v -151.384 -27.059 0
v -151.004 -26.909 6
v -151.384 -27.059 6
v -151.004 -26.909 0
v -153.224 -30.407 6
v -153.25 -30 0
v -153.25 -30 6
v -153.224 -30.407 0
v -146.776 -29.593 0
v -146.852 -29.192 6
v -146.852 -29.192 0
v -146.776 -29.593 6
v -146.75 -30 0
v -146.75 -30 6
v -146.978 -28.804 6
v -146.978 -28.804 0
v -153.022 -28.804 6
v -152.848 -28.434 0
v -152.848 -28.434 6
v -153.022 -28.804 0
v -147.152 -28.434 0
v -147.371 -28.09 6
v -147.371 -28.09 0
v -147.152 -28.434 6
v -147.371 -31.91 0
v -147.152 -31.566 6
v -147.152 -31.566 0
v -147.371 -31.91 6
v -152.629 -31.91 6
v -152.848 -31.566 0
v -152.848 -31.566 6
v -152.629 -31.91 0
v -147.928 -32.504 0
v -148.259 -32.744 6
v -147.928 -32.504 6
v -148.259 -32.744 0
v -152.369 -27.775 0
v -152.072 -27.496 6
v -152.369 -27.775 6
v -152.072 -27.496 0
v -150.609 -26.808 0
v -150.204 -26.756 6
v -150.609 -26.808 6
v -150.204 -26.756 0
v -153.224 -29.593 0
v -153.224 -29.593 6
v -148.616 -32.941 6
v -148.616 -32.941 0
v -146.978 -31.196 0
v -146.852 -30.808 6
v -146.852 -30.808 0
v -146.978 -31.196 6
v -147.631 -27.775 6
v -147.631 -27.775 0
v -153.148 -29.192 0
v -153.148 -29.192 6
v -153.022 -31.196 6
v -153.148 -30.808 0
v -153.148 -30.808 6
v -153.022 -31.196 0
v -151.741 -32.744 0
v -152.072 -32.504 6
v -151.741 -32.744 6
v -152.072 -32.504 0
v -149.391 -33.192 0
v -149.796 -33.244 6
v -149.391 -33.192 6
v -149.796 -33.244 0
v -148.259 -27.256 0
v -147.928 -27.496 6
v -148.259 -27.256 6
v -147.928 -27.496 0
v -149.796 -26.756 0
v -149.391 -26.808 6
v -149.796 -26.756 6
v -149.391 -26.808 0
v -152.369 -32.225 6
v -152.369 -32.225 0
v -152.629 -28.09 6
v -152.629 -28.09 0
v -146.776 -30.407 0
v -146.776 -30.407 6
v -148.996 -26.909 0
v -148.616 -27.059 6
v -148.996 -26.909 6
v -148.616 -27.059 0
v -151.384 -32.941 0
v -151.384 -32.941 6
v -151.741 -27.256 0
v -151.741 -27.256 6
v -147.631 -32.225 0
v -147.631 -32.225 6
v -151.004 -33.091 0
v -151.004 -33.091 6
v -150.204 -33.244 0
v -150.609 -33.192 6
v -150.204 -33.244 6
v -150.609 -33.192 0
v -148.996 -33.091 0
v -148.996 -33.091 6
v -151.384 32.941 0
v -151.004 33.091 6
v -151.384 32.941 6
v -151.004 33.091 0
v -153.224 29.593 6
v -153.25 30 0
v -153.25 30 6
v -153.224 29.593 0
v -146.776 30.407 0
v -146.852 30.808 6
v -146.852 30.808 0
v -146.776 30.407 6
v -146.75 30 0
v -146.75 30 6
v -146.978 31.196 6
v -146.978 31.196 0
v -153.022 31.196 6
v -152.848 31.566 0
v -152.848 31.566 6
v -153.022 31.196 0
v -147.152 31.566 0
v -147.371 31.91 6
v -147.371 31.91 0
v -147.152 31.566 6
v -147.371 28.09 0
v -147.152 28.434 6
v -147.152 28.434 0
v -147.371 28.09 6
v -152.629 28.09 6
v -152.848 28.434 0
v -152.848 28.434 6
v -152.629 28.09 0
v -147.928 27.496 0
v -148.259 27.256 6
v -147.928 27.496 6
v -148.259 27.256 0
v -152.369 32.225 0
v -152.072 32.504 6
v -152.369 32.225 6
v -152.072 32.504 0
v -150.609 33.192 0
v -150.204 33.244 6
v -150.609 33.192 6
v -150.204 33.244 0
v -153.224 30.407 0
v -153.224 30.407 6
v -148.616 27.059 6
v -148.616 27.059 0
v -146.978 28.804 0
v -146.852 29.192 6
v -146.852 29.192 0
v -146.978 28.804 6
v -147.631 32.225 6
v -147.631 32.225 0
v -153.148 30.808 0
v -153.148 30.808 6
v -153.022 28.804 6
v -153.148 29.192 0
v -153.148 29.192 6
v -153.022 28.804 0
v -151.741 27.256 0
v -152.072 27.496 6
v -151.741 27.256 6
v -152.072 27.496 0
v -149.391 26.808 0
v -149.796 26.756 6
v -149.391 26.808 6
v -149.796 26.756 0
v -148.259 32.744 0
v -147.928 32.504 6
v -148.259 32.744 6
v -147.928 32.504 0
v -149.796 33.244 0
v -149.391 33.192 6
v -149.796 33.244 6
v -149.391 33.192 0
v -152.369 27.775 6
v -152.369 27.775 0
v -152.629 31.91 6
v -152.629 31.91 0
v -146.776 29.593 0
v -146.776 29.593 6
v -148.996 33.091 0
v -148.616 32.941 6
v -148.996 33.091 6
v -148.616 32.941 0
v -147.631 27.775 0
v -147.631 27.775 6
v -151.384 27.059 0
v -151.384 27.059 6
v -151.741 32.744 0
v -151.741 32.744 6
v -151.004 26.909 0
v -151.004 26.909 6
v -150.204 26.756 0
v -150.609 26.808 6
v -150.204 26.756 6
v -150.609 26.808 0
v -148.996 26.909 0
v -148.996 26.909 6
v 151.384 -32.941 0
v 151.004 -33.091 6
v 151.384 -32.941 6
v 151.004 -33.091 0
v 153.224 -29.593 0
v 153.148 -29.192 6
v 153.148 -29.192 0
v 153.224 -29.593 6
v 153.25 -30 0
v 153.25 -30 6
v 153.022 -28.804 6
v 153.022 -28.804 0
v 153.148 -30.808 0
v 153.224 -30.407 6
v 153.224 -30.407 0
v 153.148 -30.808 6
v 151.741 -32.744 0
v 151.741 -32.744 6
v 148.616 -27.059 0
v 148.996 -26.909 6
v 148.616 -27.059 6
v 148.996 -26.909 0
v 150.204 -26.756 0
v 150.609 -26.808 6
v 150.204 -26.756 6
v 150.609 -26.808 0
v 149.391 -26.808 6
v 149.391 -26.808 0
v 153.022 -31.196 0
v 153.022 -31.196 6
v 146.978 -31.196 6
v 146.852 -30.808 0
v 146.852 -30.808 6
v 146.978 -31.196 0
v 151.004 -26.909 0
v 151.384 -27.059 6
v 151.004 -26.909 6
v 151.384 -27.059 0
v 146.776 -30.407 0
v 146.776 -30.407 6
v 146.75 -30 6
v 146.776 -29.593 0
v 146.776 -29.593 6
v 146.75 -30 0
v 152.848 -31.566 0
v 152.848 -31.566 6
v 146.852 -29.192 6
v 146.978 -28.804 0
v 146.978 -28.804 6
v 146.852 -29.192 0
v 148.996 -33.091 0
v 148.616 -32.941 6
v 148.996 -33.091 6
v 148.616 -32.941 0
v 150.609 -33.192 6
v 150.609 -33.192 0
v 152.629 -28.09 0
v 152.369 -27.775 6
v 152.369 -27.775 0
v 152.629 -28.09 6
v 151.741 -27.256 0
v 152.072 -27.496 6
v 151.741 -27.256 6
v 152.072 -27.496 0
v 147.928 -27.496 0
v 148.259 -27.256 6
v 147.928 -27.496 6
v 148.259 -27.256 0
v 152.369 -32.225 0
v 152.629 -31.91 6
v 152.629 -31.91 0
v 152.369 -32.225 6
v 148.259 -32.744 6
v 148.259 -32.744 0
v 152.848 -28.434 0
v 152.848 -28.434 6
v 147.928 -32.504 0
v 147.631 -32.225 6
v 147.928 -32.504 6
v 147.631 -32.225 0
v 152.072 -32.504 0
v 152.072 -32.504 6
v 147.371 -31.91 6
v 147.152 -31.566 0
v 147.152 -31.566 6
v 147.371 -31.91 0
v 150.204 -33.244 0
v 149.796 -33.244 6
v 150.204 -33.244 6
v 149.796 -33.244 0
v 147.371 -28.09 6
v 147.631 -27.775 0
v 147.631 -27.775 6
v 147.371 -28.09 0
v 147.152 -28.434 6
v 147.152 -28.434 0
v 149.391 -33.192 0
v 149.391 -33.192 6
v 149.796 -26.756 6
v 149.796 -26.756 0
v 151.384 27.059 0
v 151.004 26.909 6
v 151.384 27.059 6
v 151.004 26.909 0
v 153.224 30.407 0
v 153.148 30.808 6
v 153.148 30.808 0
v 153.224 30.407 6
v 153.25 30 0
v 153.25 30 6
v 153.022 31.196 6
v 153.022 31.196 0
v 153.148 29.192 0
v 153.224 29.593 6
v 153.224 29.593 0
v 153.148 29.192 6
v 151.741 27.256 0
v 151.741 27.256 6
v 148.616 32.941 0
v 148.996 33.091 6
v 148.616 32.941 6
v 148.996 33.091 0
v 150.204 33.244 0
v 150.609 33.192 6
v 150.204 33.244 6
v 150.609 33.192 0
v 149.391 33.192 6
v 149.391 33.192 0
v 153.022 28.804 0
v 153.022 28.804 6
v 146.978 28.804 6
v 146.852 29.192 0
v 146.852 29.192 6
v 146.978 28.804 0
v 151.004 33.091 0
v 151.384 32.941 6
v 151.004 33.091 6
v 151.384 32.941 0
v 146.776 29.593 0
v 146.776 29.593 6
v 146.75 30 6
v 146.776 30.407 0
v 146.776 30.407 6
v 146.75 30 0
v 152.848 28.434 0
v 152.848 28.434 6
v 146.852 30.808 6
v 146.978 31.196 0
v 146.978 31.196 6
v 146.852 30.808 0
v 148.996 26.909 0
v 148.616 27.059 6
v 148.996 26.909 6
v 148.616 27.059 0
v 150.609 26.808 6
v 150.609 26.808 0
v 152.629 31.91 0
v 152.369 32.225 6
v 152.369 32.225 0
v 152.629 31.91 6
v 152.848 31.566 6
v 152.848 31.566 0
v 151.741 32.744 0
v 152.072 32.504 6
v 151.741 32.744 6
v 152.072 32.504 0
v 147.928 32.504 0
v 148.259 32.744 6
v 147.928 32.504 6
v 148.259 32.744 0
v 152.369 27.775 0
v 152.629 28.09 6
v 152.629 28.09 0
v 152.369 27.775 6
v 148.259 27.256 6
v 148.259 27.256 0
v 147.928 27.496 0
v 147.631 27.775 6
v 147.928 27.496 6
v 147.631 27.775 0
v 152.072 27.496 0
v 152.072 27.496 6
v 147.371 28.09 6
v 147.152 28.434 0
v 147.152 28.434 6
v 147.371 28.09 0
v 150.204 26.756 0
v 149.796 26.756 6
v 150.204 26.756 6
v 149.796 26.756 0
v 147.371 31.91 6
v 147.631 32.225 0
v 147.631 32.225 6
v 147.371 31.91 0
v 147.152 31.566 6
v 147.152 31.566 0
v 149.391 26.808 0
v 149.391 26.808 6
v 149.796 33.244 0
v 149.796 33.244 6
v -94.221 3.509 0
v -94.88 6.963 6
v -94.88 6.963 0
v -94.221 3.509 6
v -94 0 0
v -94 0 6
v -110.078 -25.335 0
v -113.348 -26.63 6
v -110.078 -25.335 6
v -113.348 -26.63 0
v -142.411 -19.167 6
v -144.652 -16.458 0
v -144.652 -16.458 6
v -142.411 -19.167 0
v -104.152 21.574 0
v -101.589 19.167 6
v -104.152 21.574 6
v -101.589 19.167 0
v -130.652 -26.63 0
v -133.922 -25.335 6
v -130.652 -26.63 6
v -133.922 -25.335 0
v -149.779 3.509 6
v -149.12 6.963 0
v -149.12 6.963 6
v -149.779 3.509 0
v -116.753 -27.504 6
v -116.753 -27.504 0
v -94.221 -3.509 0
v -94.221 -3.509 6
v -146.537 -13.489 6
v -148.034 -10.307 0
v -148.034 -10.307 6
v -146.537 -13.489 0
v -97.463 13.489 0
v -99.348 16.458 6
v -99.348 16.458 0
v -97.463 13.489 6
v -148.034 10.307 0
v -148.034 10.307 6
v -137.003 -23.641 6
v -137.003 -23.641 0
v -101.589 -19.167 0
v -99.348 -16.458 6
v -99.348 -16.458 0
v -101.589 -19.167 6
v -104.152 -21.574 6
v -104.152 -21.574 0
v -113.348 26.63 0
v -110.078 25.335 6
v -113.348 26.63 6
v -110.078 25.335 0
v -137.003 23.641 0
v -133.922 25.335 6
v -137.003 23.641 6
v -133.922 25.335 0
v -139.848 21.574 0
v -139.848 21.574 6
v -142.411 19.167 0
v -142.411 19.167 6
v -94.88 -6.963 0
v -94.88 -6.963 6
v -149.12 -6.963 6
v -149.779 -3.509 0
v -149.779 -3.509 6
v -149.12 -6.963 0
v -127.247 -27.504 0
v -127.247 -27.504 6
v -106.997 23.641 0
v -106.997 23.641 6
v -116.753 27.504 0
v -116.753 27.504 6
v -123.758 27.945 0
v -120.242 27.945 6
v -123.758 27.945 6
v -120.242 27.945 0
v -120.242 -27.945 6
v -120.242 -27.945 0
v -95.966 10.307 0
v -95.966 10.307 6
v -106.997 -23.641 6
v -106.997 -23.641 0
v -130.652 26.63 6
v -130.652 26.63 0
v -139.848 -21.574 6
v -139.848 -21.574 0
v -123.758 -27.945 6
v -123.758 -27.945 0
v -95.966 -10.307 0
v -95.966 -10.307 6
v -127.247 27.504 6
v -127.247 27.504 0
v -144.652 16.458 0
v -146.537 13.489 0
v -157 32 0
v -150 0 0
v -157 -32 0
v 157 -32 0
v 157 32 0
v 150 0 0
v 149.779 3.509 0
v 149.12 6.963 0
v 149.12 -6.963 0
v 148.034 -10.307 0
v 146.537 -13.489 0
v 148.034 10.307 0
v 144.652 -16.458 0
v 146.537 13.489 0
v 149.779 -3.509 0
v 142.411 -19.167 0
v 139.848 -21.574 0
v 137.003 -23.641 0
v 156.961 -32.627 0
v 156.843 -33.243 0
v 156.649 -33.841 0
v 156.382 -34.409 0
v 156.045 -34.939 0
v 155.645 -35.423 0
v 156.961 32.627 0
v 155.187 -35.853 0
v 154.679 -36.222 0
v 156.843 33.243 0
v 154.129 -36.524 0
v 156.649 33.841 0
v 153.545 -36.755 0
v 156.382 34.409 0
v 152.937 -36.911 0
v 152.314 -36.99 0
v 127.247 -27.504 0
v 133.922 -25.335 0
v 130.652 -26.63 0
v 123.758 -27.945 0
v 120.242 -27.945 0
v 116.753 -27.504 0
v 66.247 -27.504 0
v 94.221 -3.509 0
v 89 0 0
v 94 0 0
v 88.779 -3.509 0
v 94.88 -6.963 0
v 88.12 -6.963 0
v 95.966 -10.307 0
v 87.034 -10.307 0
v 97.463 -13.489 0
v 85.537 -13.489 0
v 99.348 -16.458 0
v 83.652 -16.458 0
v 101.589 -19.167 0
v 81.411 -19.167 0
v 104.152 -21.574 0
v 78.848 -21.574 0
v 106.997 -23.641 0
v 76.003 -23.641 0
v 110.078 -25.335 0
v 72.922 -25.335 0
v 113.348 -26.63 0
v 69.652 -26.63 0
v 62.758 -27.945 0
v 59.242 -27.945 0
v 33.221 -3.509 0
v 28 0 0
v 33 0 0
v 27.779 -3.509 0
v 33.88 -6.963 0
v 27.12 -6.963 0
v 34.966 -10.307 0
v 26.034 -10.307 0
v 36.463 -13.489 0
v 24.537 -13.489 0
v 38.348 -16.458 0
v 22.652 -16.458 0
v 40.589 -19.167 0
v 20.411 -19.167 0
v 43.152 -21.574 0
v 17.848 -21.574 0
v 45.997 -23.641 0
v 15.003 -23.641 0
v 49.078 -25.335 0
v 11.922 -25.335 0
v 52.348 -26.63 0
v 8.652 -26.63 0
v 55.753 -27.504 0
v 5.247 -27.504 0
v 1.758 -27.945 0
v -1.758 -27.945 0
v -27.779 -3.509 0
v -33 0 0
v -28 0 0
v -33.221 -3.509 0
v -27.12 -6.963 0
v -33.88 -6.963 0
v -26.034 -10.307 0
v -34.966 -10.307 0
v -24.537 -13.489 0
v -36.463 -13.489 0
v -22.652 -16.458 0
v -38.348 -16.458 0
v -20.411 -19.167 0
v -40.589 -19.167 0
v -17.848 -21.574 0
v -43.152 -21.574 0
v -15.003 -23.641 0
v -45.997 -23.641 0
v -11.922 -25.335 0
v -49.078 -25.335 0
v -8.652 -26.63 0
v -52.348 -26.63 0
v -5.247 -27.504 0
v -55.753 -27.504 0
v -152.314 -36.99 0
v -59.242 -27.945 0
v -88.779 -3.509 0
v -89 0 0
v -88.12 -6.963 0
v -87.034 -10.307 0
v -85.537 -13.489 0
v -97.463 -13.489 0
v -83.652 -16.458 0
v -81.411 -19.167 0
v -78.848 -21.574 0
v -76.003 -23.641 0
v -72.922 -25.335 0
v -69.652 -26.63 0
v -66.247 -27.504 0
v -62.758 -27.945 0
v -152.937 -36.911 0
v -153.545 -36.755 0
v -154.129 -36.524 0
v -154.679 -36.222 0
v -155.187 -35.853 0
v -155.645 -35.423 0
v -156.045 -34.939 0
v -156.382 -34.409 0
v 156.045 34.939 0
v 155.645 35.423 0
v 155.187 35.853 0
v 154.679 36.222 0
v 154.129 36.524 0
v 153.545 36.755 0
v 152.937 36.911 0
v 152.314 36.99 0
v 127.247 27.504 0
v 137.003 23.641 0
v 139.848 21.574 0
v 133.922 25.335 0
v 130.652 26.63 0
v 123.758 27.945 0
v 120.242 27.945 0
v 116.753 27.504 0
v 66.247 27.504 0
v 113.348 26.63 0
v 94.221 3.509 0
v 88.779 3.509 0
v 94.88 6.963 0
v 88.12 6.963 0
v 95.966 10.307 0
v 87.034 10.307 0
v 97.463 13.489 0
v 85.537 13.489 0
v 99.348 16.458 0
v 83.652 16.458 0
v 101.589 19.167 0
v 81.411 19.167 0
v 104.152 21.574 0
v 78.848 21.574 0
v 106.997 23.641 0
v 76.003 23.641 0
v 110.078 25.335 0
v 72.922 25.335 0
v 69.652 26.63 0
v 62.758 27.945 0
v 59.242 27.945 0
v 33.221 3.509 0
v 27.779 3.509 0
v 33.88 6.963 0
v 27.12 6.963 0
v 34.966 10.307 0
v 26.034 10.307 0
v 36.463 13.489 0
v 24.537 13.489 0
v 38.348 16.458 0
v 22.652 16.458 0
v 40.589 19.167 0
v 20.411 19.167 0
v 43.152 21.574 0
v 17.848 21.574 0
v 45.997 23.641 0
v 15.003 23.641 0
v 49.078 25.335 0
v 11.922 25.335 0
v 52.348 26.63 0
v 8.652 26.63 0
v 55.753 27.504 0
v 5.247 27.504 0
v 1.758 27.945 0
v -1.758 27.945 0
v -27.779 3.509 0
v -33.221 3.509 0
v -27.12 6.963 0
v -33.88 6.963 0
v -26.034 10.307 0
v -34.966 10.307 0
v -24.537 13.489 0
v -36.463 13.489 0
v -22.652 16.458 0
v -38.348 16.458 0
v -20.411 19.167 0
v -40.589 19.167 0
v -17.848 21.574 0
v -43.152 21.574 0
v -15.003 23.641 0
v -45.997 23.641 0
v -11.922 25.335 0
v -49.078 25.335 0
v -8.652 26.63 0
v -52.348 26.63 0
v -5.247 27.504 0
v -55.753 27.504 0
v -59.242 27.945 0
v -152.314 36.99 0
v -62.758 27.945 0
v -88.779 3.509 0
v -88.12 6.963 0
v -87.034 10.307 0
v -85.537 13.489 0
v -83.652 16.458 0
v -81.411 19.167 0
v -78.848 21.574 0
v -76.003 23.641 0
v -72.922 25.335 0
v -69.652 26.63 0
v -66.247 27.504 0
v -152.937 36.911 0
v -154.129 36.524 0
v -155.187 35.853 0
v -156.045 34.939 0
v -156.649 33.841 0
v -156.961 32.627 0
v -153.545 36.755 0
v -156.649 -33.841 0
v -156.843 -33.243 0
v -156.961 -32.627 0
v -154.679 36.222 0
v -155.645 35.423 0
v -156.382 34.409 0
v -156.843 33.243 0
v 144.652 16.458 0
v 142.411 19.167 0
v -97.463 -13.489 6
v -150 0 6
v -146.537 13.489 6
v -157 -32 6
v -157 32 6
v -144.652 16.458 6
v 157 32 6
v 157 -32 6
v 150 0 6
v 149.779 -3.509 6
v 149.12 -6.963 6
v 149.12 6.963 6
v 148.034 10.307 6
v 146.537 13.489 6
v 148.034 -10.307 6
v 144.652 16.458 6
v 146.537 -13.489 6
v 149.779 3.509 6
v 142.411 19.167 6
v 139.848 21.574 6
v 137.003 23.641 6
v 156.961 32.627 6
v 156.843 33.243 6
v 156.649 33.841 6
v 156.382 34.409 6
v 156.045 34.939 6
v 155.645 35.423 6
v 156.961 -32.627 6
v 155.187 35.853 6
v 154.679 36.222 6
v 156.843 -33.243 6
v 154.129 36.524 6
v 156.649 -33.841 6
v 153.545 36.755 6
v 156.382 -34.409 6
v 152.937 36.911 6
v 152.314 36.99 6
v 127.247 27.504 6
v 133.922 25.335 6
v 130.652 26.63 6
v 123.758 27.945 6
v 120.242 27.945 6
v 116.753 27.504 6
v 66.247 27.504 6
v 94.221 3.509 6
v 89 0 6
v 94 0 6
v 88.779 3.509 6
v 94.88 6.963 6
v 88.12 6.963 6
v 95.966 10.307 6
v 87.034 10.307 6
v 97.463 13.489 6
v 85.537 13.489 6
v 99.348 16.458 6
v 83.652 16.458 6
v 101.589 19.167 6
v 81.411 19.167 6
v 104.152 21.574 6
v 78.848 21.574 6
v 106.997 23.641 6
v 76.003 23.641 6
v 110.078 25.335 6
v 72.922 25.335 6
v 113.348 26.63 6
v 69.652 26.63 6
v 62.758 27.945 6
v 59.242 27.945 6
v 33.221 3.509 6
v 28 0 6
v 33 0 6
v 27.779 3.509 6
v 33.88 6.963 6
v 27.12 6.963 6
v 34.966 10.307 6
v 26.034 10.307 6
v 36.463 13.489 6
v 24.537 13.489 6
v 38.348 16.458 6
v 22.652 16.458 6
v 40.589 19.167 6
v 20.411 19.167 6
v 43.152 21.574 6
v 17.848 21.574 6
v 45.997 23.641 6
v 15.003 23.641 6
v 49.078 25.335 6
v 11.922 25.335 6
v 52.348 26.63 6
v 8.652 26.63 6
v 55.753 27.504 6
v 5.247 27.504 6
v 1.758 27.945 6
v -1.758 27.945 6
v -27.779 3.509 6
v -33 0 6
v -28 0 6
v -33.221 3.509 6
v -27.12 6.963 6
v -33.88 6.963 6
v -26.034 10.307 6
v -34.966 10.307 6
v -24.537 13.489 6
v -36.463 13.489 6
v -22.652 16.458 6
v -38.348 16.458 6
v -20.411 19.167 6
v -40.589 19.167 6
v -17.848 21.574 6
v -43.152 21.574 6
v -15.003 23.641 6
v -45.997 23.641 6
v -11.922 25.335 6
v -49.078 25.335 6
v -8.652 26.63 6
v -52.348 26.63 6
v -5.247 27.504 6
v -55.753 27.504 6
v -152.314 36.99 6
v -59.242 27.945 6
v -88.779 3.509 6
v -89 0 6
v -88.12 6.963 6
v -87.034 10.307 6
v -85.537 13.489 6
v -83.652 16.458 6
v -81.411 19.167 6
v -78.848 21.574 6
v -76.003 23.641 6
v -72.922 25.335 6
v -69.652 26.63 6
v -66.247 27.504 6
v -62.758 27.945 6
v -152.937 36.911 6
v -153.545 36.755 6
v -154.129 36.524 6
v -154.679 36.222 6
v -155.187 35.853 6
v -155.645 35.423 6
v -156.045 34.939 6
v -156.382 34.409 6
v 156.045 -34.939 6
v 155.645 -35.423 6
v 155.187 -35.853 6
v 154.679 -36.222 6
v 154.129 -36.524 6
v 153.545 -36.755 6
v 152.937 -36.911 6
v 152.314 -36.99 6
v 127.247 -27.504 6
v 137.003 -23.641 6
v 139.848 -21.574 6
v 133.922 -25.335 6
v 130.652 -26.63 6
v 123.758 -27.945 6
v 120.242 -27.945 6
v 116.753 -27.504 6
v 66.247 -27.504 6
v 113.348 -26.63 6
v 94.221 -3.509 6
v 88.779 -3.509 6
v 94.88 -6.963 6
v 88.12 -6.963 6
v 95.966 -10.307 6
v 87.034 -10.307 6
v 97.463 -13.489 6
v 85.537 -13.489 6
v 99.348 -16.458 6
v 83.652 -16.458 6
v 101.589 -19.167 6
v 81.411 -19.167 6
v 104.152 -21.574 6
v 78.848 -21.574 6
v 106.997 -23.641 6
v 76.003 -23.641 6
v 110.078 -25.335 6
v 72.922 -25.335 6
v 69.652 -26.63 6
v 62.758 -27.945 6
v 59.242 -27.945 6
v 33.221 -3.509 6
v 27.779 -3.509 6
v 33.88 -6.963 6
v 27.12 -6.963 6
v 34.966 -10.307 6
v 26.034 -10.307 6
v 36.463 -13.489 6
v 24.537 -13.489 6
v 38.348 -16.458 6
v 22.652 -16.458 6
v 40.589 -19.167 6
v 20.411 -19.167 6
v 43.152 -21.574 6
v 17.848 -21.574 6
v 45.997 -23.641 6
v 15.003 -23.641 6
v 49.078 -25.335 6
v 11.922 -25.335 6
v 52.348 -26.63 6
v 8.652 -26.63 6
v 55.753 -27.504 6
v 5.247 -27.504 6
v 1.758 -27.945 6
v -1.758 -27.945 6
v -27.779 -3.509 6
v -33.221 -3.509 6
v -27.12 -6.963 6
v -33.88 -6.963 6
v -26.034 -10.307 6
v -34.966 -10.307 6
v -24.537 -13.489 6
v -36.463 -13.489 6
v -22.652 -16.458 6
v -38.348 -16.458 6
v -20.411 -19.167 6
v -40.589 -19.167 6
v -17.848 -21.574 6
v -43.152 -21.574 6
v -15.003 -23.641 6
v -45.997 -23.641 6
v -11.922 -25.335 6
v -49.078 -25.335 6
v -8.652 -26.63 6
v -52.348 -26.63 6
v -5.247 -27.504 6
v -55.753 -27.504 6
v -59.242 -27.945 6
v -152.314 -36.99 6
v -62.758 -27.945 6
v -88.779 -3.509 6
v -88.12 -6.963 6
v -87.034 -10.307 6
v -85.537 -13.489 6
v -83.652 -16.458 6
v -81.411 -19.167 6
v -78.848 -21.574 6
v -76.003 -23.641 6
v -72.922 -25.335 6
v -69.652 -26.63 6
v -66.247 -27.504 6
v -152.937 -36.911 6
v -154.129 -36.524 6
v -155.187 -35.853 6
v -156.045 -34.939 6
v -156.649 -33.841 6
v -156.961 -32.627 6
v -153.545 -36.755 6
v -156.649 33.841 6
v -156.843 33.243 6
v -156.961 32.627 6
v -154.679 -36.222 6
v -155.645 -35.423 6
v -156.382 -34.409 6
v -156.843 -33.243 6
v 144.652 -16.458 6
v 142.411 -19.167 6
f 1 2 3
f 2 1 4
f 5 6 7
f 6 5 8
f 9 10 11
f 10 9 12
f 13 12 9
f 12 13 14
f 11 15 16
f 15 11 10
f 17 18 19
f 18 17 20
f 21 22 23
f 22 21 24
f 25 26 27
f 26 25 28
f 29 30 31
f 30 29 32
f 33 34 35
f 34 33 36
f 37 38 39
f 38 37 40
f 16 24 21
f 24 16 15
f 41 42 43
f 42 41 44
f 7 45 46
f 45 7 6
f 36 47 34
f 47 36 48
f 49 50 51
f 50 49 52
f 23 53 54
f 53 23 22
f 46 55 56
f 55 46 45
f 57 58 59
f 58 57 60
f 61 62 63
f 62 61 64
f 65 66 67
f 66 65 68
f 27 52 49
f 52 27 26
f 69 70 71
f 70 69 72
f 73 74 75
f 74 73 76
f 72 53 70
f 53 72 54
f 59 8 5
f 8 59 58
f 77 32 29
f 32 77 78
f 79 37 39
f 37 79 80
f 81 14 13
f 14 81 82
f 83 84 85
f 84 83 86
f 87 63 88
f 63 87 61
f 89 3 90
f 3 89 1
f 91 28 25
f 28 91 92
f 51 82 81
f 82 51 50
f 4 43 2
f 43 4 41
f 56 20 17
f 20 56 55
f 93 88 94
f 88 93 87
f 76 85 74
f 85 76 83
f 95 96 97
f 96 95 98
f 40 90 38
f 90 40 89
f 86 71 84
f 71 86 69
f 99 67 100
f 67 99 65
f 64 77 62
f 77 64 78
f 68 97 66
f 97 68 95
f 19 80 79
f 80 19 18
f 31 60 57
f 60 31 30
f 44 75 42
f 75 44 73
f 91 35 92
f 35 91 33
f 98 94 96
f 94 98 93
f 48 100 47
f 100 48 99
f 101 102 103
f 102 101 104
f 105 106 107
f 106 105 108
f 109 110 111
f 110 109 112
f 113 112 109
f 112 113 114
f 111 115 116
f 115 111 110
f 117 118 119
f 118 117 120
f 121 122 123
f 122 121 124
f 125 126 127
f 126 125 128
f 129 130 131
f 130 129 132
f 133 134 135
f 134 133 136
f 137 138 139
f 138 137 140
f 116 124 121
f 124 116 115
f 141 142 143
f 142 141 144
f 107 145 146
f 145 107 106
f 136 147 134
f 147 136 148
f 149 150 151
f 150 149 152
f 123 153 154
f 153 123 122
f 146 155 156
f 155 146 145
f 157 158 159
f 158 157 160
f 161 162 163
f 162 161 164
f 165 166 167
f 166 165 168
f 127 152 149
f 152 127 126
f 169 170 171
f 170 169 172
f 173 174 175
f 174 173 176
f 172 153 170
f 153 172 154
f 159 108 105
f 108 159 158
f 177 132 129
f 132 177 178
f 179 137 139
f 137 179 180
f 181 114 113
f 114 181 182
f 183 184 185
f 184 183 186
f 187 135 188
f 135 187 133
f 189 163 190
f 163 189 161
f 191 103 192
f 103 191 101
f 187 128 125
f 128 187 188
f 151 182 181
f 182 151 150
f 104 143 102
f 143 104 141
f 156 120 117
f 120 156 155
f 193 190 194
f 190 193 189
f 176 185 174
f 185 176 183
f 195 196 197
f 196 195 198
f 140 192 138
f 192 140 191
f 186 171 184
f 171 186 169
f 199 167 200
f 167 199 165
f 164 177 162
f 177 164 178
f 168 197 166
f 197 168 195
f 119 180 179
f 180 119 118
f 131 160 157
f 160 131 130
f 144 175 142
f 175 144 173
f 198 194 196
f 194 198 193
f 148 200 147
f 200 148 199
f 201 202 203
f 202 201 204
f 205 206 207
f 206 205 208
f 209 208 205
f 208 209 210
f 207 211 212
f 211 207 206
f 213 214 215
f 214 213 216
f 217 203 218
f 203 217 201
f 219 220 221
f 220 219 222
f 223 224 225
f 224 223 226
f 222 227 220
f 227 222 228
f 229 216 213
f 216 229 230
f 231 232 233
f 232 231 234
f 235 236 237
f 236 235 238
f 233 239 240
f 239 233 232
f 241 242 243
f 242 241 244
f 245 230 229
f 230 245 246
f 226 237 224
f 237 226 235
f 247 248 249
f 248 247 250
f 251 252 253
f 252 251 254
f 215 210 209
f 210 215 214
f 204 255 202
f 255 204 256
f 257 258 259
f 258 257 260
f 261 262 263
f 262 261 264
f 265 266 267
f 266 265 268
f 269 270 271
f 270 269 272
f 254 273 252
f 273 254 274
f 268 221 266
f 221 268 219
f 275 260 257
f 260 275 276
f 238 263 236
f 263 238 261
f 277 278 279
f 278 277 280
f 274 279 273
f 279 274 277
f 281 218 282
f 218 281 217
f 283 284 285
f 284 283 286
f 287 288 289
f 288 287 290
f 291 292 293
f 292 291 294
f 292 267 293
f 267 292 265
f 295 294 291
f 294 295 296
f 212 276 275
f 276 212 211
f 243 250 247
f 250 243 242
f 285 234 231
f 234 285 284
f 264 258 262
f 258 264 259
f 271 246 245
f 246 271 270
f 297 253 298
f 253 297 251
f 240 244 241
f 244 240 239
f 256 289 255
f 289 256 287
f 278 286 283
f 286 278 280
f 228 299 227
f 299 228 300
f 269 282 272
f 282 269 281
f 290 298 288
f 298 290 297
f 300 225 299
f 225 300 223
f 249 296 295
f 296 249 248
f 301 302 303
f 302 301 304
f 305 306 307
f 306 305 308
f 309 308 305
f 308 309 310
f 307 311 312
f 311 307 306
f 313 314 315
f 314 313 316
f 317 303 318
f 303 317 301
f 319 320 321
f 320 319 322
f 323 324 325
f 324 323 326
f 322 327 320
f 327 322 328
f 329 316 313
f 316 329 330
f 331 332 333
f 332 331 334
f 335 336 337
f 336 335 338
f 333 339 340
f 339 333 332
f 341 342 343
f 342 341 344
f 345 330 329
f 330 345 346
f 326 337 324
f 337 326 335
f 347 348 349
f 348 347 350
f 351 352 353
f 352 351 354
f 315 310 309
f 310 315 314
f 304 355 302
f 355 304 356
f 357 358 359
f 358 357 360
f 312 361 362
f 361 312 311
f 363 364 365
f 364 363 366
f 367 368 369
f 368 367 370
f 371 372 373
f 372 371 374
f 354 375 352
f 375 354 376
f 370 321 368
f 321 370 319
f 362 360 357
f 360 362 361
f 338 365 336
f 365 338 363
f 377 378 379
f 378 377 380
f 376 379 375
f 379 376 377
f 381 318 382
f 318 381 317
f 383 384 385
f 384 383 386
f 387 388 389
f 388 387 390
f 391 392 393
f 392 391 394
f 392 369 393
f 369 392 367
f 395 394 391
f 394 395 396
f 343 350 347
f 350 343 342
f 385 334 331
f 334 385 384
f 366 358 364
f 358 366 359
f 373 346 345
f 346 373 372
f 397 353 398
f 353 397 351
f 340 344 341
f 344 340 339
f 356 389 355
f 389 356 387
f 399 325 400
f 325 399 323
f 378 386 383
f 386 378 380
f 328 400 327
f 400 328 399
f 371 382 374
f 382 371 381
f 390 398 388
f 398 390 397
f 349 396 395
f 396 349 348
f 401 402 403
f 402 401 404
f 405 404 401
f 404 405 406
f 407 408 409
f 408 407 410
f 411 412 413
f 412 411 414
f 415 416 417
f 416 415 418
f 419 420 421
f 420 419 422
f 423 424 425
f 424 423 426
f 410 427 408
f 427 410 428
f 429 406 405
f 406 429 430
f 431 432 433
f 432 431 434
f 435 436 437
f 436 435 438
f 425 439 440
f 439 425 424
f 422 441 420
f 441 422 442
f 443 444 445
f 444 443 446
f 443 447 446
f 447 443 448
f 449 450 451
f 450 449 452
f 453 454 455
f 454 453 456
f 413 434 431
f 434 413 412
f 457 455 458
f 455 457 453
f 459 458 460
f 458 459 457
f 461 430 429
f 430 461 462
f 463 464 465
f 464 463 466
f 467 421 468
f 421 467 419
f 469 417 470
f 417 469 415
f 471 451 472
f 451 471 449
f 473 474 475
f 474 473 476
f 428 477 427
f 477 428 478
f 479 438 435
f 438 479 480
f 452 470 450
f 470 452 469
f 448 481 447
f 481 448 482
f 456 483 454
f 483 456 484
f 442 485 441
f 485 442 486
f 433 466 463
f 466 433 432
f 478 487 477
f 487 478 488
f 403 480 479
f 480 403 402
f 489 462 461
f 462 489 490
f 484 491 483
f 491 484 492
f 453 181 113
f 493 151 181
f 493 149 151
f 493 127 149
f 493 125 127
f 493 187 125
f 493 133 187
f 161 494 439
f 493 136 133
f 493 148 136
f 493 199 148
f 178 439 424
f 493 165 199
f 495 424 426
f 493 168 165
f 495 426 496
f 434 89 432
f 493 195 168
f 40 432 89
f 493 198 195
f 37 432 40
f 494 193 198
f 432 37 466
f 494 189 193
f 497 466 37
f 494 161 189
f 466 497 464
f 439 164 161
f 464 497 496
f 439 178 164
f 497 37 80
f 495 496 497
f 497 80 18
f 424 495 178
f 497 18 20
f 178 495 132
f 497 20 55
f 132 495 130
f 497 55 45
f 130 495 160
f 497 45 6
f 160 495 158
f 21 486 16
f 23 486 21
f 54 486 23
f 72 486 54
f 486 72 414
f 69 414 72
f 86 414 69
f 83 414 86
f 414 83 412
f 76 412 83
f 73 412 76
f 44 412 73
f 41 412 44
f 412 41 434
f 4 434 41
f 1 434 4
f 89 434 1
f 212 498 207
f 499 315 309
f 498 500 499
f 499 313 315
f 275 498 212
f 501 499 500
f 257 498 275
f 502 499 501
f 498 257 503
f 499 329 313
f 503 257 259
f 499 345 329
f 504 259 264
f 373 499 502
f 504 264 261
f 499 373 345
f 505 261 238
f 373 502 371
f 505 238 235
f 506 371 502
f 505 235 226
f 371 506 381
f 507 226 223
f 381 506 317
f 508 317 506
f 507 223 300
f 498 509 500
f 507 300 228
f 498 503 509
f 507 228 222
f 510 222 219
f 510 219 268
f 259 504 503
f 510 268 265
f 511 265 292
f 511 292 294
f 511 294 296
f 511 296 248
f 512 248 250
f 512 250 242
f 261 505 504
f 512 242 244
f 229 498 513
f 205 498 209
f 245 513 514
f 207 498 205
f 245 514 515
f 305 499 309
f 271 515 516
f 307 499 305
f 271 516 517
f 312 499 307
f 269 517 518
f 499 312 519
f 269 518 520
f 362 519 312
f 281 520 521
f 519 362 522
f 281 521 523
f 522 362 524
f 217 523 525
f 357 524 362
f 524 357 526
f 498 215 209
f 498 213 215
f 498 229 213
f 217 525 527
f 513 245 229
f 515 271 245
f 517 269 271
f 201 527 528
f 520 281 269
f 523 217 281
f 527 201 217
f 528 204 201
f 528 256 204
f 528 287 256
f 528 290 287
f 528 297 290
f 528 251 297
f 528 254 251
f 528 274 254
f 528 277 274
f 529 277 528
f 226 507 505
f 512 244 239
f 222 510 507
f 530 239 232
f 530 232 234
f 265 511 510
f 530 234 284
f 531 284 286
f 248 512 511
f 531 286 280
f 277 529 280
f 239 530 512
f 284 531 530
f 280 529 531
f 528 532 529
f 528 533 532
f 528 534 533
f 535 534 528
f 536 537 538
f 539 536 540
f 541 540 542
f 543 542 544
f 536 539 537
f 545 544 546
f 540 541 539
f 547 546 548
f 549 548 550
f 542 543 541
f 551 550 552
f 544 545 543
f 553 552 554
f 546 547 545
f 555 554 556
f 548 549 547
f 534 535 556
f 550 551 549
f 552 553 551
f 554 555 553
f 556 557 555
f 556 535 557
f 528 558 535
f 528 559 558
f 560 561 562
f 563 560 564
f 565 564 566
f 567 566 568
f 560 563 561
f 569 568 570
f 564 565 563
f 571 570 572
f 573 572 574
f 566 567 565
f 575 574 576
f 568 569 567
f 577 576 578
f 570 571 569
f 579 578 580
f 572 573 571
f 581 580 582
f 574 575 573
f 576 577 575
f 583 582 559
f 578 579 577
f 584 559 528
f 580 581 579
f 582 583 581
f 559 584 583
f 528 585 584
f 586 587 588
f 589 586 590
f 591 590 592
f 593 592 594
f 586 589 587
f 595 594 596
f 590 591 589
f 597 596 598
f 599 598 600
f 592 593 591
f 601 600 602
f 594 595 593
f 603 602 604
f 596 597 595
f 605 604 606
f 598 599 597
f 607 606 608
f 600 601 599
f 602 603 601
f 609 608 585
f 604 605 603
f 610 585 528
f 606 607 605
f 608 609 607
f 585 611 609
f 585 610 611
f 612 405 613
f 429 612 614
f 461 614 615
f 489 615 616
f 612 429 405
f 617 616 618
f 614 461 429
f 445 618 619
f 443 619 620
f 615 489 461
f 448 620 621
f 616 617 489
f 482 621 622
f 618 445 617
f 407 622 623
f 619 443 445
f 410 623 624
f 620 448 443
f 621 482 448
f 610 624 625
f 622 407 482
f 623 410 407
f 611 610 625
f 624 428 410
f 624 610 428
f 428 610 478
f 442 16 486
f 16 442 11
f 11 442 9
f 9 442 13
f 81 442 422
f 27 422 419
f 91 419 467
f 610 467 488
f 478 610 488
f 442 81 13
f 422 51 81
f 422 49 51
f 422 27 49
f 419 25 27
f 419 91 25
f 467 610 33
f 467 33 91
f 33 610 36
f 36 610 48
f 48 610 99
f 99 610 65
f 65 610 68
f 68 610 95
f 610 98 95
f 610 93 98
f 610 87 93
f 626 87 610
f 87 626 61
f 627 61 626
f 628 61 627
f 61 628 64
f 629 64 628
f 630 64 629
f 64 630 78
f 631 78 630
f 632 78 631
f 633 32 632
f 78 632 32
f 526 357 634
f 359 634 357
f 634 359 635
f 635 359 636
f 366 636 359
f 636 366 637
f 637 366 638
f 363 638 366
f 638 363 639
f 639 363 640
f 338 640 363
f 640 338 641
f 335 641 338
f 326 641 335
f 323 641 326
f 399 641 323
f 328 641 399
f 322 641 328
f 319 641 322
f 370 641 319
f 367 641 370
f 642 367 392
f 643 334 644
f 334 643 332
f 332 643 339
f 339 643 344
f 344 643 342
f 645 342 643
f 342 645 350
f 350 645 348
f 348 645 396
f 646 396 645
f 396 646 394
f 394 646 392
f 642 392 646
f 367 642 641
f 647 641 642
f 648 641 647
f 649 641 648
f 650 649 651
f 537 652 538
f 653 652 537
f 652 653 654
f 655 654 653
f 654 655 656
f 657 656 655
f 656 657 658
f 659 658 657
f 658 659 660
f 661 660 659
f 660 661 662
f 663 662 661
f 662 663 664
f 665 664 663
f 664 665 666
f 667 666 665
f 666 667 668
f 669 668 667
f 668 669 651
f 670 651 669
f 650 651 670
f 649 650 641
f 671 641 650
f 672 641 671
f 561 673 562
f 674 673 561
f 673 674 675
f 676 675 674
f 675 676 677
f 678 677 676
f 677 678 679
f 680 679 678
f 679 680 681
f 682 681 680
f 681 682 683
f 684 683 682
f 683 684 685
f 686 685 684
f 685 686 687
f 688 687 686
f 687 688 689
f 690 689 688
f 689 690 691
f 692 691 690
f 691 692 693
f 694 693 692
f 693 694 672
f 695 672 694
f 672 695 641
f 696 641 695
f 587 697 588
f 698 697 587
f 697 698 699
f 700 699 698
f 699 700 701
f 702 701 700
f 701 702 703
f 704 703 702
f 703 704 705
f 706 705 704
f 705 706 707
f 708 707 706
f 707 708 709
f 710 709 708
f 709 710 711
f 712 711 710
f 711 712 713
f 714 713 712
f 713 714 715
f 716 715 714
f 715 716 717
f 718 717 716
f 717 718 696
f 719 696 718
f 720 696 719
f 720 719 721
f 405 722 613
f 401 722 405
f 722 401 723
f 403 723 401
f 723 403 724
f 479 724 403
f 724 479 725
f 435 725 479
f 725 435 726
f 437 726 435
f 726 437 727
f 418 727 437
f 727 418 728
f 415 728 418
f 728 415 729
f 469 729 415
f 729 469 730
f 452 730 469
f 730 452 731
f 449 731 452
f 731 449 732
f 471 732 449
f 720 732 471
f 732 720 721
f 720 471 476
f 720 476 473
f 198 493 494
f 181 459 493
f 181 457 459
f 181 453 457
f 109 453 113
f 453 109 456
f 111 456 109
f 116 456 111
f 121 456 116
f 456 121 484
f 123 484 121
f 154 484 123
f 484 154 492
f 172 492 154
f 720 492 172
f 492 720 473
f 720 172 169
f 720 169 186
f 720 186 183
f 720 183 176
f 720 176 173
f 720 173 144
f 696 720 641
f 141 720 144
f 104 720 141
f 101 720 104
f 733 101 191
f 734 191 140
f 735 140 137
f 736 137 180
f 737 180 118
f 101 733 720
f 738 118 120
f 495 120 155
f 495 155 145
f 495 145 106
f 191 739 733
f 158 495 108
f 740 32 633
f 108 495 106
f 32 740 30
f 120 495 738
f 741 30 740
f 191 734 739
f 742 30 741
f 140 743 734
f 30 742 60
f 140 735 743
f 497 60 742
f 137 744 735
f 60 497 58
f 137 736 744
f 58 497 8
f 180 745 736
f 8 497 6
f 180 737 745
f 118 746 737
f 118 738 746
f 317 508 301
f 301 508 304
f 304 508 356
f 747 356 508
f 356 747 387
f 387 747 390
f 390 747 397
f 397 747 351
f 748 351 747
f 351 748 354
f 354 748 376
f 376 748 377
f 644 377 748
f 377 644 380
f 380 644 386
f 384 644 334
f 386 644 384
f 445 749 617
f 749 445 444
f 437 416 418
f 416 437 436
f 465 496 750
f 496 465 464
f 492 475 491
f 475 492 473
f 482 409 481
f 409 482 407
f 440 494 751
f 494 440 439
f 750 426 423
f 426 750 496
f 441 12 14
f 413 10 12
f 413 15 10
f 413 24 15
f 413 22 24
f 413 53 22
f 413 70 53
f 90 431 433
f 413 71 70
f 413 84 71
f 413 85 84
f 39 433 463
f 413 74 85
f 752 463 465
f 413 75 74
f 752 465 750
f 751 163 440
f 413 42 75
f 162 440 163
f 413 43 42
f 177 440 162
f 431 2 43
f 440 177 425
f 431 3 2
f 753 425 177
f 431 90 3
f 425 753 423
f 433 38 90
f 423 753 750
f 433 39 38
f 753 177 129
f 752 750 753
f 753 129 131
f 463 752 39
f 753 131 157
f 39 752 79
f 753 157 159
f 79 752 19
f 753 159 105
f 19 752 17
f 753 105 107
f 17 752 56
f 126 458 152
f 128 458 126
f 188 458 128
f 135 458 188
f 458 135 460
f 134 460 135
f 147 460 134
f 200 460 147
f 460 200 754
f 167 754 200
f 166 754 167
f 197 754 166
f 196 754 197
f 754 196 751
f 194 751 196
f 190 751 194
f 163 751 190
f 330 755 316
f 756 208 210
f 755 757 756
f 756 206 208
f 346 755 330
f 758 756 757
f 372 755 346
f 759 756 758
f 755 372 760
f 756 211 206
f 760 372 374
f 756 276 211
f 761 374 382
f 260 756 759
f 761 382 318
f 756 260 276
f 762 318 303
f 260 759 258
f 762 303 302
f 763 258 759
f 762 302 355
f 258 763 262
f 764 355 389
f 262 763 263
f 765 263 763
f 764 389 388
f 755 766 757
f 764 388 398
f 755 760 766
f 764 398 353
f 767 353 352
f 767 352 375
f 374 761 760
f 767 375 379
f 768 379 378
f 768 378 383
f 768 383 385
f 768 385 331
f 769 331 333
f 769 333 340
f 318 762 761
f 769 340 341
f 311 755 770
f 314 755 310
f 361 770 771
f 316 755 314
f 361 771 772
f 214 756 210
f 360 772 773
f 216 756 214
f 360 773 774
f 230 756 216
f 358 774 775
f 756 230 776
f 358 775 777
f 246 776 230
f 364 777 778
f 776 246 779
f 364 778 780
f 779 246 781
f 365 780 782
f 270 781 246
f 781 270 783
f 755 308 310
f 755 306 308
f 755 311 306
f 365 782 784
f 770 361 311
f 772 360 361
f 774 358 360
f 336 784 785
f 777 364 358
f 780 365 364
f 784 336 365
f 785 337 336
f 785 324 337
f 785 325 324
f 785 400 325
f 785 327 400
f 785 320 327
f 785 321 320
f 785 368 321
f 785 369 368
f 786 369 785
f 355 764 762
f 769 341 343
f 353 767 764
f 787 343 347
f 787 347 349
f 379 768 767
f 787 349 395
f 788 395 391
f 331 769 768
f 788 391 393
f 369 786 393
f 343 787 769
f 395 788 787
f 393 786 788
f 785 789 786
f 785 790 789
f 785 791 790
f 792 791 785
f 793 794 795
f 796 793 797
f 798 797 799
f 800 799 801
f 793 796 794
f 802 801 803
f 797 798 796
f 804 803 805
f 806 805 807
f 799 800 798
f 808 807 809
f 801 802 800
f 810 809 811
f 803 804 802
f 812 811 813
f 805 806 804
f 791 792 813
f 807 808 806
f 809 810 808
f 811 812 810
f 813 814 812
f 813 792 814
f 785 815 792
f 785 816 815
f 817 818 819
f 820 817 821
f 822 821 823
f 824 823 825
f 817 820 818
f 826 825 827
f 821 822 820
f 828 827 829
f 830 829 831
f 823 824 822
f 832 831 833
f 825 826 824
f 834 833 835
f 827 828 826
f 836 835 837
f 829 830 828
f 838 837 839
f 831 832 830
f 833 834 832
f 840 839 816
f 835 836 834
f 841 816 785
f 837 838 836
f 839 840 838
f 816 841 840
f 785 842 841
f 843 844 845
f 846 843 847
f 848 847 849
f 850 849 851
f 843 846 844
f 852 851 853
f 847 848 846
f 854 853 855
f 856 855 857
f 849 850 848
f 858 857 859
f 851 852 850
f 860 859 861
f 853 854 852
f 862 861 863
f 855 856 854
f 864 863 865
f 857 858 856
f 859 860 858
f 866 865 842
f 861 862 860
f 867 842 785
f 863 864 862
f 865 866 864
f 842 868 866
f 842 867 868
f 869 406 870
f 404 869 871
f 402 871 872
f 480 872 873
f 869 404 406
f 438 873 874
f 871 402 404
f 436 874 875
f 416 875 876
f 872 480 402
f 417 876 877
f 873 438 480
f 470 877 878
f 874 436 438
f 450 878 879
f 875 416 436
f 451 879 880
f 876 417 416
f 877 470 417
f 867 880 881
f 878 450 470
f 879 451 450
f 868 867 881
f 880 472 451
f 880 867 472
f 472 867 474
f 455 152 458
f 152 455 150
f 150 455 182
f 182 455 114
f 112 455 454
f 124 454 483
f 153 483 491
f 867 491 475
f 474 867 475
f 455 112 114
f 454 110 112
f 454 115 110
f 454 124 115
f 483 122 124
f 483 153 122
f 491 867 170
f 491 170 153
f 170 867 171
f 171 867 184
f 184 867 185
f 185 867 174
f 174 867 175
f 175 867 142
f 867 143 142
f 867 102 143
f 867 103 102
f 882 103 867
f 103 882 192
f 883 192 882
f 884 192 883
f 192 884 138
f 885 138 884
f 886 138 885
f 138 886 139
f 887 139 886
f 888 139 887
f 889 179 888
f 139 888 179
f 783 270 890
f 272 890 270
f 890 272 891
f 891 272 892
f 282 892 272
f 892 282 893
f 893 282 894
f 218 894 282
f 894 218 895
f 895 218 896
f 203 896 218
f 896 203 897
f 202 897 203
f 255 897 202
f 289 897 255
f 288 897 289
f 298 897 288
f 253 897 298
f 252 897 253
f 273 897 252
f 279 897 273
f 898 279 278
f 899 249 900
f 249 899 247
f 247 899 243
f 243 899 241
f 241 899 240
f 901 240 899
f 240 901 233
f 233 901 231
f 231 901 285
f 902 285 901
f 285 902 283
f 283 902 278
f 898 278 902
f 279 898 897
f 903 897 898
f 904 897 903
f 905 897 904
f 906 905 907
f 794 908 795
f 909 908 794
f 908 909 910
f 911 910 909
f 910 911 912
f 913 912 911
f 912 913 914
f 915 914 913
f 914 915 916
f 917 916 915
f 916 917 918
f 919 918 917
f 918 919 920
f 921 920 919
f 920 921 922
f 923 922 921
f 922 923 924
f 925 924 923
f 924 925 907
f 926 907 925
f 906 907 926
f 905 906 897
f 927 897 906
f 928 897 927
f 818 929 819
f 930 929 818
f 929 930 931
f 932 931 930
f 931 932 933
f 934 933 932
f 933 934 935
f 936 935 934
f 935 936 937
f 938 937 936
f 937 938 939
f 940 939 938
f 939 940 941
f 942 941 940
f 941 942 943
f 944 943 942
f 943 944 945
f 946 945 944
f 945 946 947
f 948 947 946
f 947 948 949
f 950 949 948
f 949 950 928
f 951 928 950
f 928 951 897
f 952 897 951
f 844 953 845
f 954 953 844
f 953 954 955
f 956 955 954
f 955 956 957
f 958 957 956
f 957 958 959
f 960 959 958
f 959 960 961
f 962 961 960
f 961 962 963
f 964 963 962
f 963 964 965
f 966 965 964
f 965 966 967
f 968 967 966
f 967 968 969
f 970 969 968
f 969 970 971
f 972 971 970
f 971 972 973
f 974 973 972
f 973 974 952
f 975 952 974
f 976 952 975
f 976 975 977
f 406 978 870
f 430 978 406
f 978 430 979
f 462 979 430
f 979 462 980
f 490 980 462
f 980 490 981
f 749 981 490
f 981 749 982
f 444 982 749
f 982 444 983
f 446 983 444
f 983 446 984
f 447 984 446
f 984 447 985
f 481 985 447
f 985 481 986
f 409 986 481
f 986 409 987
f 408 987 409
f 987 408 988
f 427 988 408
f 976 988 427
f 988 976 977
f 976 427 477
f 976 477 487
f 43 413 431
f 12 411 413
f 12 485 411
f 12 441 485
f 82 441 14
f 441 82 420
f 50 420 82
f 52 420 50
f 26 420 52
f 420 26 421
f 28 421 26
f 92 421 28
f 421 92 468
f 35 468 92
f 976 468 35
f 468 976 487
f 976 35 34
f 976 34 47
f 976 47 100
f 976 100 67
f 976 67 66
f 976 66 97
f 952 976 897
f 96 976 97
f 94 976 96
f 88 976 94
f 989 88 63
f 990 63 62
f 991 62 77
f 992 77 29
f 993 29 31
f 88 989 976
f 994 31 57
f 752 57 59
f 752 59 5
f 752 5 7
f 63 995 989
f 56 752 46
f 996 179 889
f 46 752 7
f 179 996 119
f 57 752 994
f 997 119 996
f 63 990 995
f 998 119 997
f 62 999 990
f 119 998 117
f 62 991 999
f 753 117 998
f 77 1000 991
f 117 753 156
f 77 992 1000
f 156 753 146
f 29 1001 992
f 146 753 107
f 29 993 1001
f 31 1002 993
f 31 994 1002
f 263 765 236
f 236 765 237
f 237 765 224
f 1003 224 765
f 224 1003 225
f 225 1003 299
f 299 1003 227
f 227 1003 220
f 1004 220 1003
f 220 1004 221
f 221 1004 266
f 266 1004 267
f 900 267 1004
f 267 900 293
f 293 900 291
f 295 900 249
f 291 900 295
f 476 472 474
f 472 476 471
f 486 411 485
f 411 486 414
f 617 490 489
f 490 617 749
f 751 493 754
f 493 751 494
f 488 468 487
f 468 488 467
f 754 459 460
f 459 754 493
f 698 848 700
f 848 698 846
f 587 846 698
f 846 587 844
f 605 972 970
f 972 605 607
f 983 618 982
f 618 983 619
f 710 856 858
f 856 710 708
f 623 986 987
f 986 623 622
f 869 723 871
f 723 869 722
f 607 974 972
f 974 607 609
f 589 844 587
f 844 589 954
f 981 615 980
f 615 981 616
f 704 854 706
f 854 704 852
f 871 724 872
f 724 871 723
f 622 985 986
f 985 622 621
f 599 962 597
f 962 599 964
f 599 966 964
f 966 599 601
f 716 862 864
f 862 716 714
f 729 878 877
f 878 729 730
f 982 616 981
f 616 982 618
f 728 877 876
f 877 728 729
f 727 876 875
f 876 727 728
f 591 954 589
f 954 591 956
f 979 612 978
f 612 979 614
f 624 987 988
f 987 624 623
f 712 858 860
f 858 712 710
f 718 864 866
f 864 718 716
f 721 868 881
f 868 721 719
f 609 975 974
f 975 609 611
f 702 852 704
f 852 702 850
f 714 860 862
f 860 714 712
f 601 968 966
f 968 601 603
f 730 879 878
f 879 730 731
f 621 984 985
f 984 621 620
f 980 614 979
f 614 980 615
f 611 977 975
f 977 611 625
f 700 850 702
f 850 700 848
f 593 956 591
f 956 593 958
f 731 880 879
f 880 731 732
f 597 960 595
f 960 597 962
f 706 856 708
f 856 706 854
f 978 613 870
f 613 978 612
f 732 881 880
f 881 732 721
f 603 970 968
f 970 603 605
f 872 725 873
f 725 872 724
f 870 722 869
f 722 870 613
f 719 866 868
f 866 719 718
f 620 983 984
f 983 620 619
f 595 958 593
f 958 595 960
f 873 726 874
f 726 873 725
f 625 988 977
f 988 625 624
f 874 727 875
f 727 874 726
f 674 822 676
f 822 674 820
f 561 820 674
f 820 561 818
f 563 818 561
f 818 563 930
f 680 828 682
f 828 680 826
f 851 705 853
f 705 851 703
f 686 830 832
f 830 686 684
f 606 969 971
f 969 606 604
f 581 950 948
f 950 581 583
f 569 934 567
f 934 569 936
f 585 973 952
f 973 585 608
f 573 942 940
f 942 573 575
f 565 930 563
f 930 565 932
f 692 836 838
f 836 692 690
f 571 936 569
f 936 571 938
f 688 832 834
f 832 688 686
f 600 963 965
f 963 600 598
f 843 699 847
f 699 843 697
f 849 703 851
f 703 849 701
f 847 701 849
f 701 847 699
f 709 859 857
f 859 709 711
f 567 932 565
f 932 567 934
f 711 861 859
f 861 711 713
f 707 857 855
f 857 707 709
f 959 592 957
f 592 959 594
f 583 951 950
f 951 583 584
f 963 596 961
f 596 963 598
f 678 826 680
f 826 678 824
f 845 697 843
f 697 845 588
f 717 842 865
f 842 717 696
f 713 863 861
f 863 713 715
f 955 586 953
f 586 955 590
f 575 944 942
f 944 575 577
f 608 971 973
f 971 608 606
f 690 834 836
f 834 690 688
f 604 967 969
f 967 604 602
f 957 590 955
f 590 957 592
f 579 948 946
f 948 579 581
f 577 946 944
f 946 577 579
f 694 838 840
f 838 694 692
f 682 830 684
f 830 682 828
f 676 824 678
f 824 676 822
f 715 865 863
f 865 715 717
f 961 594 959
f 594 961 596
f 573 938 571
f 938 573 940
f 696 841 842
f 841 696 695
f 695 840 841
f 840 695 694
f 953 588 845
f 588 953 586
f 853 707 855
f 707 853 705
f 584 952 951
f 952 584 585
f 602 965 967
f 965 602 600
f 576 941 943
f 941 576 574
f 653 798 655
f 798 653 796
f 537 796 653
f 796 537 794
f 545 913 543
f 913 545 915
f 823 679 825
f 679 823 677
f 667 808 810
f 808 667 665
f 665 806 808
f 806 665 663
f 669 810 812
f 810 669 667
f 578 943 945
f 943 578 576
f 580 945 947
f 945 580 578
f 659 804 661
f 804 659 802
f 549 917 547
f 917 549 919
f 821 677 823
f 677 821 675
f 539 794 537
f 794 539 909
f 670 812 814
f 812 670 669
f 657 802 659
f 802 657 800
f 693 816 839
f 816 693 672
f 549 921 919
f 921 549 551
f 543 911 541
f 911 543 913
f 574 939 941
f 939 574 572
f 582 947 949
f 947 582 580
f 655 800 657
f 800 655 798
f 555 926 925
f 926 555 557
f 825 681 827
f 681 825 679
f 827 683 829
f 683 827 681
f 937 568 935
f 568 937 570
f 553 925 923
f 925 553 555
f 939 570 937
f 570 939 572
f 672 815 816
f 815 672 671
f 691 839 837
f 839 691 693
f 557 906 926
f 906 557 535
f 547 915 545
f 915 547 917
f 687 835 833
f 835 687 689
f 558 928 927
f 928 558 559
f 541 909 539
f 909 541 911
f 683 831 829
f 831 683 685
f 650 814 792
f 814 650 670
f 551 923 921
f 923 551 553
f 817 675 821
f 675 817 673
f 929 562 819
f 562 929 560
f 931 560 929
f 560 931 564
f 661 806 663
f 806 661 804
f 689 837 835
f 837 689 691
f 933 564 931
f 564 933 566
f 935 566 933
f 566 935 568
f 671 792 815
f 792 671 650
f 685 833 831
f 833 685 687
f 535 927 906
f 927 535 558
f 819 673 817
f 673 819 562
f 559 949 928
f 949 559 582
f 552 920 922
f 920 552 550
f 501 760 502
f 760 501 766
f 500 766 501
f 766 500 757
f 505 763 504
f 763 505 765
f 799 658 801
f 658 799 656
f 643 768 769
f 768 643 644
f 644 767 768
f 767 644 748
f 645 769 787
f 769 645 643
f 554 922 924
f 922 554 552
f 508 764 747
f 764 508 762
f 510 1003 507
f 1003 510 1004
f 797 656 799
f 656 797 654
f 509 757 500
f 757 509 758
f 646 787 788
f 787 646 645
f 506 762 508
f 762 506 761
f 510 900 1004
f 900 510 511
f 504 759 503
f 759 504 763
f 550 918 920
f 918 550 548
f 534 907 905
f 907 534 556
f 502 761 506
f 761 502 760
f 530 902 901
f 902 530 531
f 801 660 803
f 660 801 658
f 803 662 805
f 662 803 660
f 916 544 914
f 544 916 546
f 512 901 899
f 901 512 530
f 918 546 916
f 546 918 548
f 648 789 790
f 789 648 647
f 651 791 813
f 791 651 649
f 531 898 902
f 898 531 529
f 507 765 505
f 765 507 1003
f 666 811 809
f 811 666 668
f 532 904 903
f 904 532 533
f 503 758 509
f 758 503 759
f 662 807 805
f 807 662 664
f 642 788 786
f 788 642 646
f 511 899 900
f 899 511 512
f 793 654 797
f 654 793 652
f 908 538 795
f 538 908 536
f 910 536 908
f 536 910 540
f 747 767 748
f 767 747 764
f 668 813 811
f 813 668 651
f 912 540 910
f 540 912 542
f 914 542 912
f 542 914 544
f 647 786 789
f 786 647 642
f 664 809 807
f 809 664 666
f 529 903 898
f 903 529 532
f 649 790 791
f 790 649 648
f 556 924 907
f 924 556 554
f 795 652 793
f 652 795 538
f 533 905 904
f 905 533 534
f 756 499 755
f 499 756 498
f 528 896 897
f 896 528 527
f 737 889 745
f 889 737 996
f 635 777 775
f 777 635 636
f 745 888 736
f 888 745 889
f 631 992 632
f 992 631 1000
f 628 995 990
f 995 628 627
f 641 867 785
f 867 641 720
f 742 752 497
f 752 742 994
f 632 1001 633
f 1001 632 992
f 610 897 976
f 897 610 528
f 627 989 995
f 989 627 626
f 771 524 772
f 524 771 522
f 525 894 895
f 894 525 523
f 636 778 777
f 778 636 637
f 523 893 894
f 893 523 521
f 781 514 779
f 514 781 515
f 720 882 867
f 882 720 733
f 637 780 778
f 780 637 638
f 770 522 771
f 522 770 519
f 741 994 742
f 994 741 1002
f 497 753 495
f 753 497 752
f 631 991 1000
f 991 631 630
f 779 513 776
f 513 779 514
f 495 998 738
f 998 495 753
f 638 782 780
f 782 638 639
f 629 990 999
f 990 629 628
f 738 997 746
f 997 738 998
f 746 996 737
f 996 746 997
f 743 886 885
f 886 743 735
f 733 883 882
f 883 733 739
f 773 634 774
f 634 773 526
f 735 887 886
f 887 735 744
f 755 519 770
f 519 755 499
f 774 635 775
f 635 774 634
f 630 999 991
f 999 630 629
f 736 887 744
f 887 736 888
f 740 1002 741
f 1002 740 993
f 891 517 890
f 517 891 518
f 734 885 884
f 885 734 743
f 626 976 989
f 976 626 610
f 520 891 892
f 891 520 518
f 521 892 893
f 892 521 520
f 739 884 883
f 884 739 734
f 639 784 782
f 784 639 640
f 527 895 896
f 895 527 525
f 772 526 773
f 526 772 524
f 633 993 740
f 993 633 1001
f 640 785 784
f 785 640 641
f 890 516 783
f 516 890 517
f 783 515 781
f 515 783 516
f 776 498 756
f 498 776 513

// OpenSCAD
$fn = 50;

difference() {
	union() {
		hull() {
			translate(v = [-152.0, 32.0, 0]) {
				cylinder(h = 6, r = 5);
			}
			translate(v = [152.0, 32.0, 0]) {
				cylinder(h = 6, r = 5);
			}
			translate(v = [-152.0, -32.0, 0]) {
				cylinder(h = 6, r = 5);
			}
			translate(v = [152.0, -32.0, 0]) {
				cylinder(h = 6, r = 5);
			}
		}
	}
	union() {
		translate(v = [-150.0, -30.0, -100.0]) {
			cylinder(h = 200, r = 3.25);
		}
		translate(v = [-150.0, 30.0, -100.0]) {
			cylinder(h = 200, r = 3.25);
		}
		translate(v = [150.0, -30.0, -100.0]) {
			cylinder(h = 200, r = 3.25);
		}
		translate(v = [150.0, 30.0, -100.0]) {
			cylinder(h = 200, r = 3.25);
		}
		translate(v = [-150.0, -30.0, -100.0]) {
			cylinder(h = 200, r = 1.8);
		}
		translate(v = [-150.0, 30.0, -100.0]) {
			cylinder(h = 200, r = 1.8);
		}
		translate(v = [150.0, -30.0, -100.0]) {
			cylinder(h = 200, r = 1.8);
		}
		translate(v = [150.0, 30.0, -100.0]) {
			cylinder(h = 200, r = 1.8);
		}
		translate(v = [-122.0, 0, 0.0]) {
			cylinder(h = 6, r = 28.0);
		}
		translate(v = [-61.0, 0, 0.0]) {
			cylinder(h = 6, r = 28.0);
		}
		cylinder(h = 6, r = 28.0);
		translate(v = [61.0, 0, 0.0]) {
			cylinder(h = 6, r = 28.0);
		}
		translate(v = [122.0, 0, 0.0]) {
			cylinder(h = 6, r = 28.0);
		}
	}
}
